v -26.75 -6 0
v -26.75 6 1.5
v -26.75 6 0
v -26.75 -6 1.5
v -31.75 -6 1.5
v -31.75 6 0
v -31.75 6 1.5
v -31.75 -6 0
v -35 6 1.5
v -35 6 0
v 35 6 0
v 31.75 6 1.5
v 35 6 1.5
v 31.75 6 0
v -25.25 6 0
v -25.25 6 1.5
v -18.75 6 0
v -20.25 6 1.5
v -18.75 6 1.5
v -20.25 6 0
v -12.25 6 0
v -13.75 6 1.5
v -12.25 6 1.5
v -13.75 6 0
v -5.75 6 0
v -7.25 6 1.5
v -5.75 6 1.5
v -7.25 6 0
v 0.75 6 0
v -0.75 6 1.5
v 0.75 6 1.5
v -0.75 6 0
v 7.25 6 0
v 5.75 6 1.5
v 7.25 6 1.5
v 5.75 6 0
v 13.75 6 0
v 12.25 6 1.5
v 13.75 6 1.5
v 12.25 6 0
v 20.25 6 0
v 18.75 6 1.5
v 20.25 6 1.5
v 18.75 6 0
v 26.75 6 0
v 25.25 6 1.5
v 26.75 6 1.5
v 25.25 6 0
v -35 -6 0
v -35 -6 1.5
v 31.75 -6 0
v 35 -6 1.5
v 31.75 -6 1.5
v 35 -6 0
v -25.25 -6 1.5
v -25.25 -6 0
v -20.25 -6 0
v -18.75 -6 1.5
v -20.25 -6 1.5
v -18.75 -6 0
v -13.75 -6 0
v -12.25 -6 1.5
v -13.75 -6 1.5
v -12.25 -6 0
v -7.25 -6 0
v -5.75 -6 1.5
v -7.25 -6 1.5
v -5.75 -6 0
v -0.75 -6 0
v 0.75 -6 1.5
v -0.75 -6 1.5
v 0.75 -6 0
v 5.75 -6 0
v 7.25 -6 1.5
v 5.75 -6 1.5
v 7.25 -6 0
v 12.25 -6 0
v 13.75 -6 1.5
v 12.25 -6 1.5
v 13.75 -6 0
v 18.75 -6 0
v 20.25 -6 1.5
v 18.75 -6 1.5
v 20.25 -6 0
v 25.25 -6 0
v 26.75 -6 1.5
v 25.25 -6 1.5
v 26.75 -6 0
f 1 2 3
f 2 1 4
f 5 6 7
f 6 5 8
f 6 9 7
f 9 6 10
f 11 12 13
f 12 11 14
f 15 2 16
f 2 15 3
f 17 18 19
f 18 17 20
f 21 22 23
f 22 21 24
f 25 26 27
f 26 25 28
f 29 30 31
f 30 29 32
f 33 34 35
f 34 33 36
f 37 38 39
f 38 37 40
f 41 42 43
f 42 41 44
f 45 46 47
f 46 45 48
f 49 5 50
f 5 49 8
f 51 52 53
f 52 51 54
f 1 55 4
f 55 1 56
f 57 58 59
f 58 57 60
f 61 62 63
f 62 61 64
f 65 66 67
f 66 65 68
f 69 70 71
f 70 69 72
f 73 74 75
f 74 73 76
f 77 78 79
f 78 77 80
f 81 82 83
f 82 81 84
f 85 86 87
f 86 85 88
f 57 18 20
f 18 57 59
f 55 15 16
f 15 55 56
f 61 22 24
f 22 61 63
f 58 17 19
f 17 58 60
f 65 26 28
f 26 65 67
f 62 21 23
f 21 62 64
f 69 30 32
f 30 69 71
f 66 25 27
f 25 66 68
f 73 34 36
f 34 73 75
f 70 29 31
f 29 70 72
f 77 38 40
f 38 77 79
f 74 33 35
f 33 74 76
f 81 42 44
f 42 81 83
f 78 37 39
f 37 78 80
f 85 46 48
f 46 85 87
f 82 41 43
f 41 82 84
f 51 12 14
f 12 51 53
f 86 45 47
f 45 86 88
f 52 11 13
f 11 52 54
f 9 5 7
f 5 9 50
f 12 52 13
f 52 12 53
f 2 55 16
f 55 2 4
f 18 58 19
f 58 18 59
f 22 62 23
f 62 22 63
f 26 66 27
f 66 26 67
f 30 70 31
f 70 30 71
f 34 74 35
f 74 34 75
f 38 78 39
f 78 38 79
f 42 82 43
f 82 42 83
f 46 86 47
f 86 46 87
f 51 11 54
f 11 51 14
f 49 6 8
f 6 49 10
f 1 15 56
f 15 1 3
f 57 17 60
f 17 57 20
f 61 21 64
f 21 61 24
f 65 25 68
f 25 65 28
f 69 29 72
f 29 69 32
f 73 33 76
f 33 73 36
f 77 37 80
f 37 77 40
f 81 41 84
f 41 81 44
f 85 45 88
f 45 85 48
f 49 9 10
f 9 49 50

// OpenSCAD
// 10-well comb for agarose gel casting
// Print orientation: flat on bed, teeth pointing down (-Z)

// ---- Dimensions (mm) ----
plate_t      = 1.5;    // plate thickness (Z)
spine_len    = 70;     // spine length (X)
spine_w      = 12;     // spine width (Y)
tooth_n      = 10;     // number of teeth
tooth_w      = 5.0;    // tooth width (X)
tooth_l      = 12;     // tooth length (Y)
gap          = 1.5;    // gap between teeth (X)
eps          = 0.5;    // cutter overshoot

$fn = 64;

pitch = tooth_w + gap;

difference() {
    // Plate
    translate([-spine_len/2, -spine_w/2, 0])
        cube([spine_len, spine_w, plate_t]);

    // Teeth
    for (i = [0 : tooth_n - 1]) {
        x = (i - (tooth_n - 1)/2) * pitch;
        translate([x - tooth_w/2, -tooth_l/2, -eps])
            cube([tooth_w, tooth_l, plate_t + 2*eps]);
    }
}
